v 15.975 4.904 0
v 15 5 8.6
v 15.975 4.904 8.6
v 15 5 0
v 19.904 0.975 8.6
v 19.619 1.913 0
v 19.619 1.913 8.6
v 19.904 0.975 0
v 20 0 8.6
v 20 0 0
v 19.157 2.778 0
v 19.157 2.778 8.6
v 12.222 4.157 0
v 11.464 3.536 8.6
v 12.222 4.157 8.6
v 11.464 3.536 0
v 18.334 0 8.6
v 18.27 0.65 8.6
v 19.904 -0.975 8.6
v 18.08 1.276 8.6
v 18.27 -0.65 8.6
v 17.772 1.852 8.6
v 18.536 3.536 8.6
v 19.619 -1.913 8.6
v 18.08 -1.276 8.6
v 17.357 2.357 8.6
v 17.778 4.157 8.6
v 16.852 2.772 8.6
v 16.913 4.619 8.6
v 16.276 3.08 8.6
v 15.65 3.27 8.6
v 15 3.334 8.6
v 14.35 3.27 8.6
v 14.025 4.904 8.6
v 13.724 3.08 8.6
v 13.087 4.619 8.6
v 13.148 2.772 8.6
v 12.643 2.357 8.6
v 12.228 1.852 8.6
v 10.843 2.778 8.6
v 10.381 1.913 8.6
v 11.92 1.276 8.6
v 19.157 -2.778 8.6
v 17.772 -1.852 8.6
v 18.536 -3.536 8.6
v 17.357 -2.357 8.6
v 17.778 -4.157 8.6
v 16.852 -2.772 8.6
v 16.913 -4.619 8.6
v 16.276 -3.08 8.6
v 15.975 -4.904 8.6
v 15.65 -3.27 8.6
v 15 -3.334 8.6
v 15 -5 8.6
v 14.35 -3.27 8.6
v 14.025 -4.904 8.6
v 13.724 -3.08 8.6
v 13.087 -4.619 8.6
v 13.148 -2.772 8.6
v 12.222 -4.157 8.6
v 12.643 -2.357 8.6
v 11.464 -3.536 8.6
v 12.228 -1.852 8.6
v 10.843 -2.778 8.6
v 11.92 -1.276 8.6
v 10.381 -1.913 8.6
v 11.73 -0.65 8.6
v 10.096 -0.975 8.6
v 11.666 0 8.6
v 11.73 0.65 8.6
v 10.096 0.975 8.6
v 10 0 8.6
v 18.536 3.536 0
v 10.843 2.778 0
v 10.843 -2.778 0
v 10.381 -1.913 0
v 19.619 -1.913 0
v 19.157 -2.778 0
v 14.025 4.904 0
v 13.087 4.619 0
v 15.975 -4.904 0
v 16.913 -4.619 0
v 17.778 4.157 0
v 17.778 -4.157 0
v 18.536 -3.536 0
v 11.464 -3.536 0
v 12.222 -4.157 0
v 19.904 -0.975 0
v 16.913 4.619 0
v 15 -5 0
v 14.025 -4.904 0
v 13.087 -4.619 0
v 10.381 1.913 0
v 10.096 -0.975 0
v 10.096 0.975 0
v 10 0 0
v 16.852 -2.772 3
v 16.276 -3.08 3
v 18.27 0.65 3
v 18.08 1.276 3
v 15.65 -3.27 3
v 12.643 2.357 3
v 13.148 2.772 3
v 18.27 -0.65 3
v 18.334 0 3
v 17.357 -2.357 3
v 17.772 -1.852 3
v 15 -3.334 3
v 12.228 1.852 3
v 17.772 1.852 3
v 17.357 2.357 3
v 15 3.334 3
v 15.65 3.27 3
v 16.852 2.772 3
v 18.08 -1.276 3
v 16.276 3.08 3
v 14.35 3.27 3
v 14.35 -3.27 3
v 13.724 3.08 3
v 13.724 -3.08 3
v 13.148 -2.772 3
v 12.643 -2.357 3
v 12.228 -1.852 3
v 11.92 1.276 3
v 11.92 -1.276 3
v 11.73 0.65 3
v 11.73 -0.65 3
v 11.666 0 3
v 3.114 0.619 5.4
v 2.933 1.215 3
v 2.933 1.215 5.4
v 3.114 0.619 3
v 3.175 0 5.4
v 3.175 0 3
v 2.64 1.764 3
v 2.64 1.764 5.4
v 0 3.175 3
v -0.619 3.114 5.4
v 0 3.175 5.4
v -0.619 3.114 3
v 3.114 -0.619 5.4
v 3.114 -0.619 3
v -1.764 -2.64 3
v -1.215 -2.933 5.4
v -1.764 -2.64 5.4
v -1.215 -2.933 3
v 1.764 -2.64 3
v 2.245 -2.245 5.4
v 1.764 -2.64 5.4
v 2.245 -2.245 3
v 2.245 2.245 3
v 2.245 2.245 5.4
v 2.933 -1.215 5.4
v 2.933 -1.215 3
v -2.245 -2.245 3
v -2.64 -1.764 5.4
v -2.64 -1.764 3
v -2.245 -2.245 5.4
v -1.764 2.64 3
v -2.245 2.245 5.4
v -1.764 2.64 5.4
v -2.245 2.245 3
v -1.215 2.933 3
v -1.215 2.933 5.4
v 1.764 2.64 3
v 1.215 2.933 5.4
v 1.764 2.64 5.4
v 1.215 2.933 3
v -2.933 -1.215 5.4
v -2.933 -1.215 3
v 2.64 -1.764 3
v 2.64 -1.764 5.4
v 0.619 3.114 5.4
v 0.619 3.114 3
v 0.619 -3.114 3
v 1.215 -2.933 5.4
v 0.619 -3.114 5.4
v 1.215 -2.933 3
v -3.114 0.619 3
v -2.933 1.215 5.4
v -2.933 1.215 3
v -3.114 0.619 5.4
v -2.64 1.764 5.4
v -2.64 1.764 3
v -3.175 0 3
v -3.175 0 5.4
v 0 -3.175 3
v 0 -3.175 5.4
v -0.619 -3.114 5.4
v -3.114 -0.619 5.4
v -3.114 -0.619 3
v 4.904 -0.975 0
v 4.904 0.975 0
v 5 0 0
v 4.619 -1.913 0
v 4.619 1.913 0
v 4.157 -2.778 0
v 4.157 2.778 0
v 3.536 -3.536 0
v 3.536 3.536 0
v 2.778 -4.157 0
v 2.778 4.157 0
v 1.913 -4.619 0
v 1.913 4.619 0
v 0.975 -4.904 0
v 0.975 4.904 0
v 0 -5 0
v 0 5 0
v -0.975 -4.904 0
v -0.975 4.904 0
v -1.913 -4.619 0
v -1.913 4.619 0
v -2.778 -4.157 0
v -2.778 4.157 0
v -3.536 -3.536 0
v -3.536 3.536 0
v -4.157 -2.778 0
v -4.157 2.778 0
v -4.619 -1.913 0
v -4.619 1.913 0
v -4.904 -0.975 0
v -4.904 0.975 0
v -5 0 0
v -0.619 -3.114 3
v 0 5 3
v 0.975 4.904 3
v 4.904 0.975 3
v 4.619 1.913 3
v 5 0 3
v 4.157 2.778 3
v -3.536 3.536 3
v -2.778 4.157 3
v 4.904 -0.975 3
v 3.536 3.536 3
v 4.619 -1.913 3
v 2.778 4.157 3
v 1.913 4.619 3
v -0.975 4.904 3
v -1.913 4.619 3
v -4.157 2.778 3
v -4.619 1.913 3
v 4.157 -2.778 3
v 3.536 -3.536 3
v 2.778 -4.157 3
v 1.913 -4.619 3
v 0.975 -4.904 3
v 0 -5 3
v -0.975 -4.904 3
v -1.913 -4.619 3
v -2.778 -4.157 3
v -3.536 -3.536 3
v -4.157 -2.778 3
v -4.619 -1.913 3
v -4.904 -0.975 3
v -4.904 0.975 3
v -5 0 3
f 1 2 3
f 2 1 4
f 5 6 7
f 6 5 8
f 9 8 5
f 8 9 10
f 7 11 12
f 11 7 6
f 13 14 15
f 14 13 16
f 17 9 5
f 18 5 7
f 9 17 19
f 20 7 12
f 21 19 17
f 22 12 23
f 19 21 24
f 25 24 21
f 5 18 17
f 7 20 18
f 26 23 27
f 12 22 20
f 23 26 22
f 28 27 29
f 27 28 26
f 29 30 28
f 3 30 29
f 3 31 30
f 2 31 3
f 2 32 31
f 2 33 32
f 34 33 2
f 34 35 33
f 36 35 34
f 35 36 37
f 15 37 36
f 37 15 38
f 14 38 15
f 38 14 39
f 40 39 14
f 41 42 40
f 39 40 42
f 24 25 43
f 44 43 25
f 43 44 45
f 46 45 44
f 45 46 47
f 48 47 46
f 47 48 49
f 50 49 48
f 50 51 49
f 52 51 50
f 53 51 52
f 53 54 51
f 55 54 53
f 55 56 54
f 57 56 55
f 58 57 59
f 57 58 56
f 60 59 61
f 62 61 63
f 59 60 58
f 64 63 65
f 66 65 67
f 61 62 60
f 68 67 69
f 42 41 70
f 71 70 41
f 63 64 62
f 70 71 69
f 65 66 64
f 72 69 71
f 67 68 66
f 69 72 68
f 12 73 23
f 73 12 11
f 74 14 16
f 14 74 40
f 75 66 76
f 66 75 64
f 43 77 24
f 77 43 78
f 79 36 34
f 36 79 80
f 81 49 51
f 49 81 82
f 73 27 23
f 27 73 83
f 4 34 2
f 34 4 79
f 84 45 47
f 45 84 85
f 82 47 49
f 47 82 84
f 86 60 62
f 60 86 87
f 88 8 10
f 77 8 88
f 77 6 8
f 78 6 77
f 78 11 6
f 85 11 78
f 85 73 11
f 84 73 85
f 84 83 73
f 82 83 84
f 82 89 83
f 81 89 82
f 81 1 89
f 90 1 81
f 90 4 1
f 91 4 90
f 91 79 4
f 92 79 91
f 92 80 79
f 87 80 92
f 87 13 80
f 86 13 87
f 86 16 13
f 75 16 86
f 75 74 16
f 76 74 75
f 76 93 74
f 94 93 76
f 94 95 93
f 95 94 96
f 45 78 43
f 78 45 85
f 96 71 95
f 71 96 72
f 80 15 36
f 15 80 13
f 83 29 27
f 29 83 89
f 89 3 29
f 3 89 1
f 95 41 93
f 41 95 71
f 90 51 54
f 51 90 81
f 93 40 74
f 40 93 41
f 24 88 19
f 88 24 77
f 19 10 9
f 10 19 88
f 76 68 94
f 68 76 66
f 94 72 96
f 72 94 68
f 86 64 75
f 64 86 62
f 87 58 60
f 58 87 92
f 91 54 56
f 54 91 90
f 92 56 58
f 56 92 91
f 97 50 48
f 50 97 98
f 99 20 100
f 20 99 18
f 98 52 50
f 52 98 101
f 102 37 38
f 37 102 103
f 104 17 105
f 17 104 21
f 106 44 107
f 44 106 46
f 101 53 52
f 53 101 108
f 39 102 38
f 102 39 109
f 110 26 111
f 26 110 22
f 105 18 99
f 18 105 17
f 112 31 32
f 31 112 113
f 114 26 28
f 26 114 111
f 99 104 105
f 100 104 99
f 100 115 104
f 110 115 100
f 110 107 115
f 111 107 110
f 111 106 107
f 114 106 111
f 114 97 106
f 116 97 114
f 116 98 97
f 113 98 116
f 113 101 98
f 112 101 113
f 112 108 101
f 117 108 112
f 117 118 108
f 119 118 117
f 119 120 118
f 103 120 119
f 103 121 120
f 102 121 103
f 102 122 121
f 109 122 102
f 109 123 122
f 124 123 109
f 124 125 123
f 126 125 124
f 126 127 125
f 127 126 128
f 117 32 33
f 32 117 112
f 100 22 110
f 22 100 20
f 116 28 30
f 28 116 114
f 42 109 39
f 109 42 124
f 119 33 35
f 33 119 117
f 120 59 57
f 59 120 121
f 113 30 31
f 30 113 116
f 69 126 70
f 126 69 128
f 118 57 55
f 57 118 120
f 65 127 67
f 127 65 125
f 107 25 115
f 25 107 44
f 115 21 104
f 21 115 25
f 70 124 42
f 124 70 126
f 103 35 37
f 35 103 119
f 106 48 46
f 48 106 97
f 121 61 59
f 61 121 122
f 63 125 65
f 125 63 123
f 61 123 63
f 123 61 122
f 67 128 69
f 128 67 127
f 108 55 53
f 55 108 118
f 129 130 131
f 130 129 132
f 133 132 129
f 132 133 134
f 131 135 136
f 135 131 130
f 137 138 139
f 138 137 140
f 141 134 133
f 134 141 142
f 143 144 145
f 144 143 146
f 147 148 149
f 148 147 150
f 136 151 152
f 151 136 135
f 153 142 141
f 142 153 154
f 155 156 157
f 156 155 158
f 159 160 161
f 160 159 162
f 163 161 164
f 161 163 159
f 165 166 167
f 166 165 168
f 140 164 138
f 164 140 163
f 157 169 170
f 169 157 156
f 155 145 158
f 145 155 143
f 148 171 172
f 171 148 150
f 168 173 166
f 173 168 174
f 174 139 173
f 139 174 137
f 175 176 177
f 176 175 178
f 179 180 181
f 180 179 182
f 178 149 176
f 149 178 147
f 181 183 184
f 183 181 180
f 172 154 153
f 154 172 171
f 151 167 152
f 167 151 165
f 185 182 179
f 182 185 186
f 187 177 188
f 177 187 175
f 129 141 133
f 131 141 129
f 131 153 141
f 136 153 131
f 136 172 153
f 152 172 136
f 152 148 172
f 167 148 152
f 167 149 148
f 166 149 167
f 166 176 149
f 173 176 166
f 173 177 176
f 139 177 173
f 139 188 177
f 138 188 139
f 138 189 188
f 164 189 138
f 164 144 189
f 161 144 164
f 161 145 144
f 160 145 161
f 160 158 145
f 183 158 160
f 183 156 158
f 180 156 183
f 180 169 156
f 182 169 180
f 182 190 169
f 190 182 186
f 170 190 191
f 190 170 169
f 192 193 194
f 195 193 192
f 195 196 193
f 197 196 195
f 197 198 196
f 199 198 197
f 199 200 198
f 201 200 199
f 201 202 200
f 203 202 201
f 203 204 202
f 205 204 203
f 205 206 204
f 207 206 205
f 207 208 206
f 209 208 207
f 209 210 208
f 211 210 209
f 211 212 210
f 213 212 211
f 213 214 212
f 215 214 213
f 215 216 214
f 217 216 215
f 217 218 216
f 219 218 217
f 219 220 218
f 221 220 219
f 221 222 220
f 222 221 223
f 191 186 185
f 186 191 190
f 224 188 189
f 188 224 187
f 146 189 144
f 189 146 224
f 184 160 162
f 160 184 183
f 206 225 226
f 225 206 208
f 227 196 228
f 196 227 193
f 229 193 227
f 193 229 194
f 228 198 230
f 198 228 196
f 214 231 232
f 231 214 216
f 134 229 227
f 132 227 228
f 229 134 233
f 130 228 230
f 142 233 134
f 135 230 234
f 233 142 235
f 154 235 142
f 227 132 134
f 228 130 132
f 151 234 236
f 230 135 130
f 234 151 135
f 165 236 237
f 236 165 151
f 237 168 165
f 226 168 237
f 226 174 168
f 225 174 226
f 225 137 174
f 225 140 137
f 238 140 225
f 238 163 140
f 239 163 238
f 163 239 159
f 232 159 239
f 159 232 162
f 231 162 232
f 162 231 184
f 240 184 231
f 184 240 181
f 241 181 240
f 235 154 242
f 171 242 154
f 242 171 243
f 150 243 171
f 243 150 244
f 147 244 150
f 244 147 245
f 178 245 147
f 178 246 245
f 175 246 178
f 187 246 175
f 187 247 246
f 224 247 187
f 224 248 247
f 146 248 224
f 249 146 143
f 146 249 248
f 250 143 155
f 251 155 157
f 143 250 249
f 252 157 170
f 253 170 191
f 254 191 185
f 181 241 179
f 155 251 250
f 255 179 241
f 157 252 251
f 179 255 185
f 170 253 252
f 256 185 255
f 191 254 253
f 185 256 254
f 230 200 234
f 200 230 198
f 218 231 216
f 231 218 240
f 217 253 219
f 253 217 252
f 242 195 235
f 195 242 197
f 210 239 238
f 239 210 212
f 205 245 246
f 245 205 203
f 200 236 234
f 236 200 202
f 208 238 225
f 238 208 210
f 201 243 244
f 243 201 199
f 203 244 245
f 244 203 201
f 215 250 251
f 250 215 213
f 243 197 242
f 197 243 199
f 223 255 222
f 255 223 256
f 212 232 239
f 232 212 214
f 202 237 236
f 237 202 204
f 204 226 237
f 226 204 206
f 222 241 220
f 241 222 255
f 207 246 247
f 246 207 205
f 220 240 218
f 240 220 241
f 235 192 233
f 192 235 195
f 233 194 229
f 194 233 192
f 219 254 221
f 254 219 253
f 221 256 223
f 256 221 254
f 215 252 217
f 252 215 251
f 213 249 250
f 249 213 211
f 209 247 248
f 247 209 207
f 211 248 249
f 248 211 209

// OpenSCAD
$fn = 32;

//module plugTest(maleDiam, femaleDiam){
//	cylinder(h = 7, d = maleDiam);
//	cylinder(h = 3, d = 9);
//	
//	translate([15,0,0])
//	difference(){
//		cylinder(h = 7, d = 10);
//		translate([0,0,3])
//		cylinder(h = 5, d = femaleDiam);
//	}
//}

module plugTest(maleDiam, femaleDiam){
	cylinder(h = 7-1.6, d = maleDiam);
	cylinder(h = 3, d = 10);
	
	translate([15,0,0])
	difference(){
		cylinder(h = 7+1.6, d = 10);
		translate([0,0,3])
		cylinder(h = 6, d = femaleDiam);
	}
}

//plugTest(6.35*.95, 6.35);

//translate([0,13,0])

//plugTest(6.35*.9, 6.35);

//translate([0,26,0])

//plugTest(6.35*.85, 6.35);



//plugTest(6.35, 6.35*1.05);

//translate([0,13,0])

//plugTest(6.35, 6.35*1.10);

//translate([0,26,0])

//plugTest(6.35, 6.35*1.15);


plugTest(6.35, 6.35*1.05);
